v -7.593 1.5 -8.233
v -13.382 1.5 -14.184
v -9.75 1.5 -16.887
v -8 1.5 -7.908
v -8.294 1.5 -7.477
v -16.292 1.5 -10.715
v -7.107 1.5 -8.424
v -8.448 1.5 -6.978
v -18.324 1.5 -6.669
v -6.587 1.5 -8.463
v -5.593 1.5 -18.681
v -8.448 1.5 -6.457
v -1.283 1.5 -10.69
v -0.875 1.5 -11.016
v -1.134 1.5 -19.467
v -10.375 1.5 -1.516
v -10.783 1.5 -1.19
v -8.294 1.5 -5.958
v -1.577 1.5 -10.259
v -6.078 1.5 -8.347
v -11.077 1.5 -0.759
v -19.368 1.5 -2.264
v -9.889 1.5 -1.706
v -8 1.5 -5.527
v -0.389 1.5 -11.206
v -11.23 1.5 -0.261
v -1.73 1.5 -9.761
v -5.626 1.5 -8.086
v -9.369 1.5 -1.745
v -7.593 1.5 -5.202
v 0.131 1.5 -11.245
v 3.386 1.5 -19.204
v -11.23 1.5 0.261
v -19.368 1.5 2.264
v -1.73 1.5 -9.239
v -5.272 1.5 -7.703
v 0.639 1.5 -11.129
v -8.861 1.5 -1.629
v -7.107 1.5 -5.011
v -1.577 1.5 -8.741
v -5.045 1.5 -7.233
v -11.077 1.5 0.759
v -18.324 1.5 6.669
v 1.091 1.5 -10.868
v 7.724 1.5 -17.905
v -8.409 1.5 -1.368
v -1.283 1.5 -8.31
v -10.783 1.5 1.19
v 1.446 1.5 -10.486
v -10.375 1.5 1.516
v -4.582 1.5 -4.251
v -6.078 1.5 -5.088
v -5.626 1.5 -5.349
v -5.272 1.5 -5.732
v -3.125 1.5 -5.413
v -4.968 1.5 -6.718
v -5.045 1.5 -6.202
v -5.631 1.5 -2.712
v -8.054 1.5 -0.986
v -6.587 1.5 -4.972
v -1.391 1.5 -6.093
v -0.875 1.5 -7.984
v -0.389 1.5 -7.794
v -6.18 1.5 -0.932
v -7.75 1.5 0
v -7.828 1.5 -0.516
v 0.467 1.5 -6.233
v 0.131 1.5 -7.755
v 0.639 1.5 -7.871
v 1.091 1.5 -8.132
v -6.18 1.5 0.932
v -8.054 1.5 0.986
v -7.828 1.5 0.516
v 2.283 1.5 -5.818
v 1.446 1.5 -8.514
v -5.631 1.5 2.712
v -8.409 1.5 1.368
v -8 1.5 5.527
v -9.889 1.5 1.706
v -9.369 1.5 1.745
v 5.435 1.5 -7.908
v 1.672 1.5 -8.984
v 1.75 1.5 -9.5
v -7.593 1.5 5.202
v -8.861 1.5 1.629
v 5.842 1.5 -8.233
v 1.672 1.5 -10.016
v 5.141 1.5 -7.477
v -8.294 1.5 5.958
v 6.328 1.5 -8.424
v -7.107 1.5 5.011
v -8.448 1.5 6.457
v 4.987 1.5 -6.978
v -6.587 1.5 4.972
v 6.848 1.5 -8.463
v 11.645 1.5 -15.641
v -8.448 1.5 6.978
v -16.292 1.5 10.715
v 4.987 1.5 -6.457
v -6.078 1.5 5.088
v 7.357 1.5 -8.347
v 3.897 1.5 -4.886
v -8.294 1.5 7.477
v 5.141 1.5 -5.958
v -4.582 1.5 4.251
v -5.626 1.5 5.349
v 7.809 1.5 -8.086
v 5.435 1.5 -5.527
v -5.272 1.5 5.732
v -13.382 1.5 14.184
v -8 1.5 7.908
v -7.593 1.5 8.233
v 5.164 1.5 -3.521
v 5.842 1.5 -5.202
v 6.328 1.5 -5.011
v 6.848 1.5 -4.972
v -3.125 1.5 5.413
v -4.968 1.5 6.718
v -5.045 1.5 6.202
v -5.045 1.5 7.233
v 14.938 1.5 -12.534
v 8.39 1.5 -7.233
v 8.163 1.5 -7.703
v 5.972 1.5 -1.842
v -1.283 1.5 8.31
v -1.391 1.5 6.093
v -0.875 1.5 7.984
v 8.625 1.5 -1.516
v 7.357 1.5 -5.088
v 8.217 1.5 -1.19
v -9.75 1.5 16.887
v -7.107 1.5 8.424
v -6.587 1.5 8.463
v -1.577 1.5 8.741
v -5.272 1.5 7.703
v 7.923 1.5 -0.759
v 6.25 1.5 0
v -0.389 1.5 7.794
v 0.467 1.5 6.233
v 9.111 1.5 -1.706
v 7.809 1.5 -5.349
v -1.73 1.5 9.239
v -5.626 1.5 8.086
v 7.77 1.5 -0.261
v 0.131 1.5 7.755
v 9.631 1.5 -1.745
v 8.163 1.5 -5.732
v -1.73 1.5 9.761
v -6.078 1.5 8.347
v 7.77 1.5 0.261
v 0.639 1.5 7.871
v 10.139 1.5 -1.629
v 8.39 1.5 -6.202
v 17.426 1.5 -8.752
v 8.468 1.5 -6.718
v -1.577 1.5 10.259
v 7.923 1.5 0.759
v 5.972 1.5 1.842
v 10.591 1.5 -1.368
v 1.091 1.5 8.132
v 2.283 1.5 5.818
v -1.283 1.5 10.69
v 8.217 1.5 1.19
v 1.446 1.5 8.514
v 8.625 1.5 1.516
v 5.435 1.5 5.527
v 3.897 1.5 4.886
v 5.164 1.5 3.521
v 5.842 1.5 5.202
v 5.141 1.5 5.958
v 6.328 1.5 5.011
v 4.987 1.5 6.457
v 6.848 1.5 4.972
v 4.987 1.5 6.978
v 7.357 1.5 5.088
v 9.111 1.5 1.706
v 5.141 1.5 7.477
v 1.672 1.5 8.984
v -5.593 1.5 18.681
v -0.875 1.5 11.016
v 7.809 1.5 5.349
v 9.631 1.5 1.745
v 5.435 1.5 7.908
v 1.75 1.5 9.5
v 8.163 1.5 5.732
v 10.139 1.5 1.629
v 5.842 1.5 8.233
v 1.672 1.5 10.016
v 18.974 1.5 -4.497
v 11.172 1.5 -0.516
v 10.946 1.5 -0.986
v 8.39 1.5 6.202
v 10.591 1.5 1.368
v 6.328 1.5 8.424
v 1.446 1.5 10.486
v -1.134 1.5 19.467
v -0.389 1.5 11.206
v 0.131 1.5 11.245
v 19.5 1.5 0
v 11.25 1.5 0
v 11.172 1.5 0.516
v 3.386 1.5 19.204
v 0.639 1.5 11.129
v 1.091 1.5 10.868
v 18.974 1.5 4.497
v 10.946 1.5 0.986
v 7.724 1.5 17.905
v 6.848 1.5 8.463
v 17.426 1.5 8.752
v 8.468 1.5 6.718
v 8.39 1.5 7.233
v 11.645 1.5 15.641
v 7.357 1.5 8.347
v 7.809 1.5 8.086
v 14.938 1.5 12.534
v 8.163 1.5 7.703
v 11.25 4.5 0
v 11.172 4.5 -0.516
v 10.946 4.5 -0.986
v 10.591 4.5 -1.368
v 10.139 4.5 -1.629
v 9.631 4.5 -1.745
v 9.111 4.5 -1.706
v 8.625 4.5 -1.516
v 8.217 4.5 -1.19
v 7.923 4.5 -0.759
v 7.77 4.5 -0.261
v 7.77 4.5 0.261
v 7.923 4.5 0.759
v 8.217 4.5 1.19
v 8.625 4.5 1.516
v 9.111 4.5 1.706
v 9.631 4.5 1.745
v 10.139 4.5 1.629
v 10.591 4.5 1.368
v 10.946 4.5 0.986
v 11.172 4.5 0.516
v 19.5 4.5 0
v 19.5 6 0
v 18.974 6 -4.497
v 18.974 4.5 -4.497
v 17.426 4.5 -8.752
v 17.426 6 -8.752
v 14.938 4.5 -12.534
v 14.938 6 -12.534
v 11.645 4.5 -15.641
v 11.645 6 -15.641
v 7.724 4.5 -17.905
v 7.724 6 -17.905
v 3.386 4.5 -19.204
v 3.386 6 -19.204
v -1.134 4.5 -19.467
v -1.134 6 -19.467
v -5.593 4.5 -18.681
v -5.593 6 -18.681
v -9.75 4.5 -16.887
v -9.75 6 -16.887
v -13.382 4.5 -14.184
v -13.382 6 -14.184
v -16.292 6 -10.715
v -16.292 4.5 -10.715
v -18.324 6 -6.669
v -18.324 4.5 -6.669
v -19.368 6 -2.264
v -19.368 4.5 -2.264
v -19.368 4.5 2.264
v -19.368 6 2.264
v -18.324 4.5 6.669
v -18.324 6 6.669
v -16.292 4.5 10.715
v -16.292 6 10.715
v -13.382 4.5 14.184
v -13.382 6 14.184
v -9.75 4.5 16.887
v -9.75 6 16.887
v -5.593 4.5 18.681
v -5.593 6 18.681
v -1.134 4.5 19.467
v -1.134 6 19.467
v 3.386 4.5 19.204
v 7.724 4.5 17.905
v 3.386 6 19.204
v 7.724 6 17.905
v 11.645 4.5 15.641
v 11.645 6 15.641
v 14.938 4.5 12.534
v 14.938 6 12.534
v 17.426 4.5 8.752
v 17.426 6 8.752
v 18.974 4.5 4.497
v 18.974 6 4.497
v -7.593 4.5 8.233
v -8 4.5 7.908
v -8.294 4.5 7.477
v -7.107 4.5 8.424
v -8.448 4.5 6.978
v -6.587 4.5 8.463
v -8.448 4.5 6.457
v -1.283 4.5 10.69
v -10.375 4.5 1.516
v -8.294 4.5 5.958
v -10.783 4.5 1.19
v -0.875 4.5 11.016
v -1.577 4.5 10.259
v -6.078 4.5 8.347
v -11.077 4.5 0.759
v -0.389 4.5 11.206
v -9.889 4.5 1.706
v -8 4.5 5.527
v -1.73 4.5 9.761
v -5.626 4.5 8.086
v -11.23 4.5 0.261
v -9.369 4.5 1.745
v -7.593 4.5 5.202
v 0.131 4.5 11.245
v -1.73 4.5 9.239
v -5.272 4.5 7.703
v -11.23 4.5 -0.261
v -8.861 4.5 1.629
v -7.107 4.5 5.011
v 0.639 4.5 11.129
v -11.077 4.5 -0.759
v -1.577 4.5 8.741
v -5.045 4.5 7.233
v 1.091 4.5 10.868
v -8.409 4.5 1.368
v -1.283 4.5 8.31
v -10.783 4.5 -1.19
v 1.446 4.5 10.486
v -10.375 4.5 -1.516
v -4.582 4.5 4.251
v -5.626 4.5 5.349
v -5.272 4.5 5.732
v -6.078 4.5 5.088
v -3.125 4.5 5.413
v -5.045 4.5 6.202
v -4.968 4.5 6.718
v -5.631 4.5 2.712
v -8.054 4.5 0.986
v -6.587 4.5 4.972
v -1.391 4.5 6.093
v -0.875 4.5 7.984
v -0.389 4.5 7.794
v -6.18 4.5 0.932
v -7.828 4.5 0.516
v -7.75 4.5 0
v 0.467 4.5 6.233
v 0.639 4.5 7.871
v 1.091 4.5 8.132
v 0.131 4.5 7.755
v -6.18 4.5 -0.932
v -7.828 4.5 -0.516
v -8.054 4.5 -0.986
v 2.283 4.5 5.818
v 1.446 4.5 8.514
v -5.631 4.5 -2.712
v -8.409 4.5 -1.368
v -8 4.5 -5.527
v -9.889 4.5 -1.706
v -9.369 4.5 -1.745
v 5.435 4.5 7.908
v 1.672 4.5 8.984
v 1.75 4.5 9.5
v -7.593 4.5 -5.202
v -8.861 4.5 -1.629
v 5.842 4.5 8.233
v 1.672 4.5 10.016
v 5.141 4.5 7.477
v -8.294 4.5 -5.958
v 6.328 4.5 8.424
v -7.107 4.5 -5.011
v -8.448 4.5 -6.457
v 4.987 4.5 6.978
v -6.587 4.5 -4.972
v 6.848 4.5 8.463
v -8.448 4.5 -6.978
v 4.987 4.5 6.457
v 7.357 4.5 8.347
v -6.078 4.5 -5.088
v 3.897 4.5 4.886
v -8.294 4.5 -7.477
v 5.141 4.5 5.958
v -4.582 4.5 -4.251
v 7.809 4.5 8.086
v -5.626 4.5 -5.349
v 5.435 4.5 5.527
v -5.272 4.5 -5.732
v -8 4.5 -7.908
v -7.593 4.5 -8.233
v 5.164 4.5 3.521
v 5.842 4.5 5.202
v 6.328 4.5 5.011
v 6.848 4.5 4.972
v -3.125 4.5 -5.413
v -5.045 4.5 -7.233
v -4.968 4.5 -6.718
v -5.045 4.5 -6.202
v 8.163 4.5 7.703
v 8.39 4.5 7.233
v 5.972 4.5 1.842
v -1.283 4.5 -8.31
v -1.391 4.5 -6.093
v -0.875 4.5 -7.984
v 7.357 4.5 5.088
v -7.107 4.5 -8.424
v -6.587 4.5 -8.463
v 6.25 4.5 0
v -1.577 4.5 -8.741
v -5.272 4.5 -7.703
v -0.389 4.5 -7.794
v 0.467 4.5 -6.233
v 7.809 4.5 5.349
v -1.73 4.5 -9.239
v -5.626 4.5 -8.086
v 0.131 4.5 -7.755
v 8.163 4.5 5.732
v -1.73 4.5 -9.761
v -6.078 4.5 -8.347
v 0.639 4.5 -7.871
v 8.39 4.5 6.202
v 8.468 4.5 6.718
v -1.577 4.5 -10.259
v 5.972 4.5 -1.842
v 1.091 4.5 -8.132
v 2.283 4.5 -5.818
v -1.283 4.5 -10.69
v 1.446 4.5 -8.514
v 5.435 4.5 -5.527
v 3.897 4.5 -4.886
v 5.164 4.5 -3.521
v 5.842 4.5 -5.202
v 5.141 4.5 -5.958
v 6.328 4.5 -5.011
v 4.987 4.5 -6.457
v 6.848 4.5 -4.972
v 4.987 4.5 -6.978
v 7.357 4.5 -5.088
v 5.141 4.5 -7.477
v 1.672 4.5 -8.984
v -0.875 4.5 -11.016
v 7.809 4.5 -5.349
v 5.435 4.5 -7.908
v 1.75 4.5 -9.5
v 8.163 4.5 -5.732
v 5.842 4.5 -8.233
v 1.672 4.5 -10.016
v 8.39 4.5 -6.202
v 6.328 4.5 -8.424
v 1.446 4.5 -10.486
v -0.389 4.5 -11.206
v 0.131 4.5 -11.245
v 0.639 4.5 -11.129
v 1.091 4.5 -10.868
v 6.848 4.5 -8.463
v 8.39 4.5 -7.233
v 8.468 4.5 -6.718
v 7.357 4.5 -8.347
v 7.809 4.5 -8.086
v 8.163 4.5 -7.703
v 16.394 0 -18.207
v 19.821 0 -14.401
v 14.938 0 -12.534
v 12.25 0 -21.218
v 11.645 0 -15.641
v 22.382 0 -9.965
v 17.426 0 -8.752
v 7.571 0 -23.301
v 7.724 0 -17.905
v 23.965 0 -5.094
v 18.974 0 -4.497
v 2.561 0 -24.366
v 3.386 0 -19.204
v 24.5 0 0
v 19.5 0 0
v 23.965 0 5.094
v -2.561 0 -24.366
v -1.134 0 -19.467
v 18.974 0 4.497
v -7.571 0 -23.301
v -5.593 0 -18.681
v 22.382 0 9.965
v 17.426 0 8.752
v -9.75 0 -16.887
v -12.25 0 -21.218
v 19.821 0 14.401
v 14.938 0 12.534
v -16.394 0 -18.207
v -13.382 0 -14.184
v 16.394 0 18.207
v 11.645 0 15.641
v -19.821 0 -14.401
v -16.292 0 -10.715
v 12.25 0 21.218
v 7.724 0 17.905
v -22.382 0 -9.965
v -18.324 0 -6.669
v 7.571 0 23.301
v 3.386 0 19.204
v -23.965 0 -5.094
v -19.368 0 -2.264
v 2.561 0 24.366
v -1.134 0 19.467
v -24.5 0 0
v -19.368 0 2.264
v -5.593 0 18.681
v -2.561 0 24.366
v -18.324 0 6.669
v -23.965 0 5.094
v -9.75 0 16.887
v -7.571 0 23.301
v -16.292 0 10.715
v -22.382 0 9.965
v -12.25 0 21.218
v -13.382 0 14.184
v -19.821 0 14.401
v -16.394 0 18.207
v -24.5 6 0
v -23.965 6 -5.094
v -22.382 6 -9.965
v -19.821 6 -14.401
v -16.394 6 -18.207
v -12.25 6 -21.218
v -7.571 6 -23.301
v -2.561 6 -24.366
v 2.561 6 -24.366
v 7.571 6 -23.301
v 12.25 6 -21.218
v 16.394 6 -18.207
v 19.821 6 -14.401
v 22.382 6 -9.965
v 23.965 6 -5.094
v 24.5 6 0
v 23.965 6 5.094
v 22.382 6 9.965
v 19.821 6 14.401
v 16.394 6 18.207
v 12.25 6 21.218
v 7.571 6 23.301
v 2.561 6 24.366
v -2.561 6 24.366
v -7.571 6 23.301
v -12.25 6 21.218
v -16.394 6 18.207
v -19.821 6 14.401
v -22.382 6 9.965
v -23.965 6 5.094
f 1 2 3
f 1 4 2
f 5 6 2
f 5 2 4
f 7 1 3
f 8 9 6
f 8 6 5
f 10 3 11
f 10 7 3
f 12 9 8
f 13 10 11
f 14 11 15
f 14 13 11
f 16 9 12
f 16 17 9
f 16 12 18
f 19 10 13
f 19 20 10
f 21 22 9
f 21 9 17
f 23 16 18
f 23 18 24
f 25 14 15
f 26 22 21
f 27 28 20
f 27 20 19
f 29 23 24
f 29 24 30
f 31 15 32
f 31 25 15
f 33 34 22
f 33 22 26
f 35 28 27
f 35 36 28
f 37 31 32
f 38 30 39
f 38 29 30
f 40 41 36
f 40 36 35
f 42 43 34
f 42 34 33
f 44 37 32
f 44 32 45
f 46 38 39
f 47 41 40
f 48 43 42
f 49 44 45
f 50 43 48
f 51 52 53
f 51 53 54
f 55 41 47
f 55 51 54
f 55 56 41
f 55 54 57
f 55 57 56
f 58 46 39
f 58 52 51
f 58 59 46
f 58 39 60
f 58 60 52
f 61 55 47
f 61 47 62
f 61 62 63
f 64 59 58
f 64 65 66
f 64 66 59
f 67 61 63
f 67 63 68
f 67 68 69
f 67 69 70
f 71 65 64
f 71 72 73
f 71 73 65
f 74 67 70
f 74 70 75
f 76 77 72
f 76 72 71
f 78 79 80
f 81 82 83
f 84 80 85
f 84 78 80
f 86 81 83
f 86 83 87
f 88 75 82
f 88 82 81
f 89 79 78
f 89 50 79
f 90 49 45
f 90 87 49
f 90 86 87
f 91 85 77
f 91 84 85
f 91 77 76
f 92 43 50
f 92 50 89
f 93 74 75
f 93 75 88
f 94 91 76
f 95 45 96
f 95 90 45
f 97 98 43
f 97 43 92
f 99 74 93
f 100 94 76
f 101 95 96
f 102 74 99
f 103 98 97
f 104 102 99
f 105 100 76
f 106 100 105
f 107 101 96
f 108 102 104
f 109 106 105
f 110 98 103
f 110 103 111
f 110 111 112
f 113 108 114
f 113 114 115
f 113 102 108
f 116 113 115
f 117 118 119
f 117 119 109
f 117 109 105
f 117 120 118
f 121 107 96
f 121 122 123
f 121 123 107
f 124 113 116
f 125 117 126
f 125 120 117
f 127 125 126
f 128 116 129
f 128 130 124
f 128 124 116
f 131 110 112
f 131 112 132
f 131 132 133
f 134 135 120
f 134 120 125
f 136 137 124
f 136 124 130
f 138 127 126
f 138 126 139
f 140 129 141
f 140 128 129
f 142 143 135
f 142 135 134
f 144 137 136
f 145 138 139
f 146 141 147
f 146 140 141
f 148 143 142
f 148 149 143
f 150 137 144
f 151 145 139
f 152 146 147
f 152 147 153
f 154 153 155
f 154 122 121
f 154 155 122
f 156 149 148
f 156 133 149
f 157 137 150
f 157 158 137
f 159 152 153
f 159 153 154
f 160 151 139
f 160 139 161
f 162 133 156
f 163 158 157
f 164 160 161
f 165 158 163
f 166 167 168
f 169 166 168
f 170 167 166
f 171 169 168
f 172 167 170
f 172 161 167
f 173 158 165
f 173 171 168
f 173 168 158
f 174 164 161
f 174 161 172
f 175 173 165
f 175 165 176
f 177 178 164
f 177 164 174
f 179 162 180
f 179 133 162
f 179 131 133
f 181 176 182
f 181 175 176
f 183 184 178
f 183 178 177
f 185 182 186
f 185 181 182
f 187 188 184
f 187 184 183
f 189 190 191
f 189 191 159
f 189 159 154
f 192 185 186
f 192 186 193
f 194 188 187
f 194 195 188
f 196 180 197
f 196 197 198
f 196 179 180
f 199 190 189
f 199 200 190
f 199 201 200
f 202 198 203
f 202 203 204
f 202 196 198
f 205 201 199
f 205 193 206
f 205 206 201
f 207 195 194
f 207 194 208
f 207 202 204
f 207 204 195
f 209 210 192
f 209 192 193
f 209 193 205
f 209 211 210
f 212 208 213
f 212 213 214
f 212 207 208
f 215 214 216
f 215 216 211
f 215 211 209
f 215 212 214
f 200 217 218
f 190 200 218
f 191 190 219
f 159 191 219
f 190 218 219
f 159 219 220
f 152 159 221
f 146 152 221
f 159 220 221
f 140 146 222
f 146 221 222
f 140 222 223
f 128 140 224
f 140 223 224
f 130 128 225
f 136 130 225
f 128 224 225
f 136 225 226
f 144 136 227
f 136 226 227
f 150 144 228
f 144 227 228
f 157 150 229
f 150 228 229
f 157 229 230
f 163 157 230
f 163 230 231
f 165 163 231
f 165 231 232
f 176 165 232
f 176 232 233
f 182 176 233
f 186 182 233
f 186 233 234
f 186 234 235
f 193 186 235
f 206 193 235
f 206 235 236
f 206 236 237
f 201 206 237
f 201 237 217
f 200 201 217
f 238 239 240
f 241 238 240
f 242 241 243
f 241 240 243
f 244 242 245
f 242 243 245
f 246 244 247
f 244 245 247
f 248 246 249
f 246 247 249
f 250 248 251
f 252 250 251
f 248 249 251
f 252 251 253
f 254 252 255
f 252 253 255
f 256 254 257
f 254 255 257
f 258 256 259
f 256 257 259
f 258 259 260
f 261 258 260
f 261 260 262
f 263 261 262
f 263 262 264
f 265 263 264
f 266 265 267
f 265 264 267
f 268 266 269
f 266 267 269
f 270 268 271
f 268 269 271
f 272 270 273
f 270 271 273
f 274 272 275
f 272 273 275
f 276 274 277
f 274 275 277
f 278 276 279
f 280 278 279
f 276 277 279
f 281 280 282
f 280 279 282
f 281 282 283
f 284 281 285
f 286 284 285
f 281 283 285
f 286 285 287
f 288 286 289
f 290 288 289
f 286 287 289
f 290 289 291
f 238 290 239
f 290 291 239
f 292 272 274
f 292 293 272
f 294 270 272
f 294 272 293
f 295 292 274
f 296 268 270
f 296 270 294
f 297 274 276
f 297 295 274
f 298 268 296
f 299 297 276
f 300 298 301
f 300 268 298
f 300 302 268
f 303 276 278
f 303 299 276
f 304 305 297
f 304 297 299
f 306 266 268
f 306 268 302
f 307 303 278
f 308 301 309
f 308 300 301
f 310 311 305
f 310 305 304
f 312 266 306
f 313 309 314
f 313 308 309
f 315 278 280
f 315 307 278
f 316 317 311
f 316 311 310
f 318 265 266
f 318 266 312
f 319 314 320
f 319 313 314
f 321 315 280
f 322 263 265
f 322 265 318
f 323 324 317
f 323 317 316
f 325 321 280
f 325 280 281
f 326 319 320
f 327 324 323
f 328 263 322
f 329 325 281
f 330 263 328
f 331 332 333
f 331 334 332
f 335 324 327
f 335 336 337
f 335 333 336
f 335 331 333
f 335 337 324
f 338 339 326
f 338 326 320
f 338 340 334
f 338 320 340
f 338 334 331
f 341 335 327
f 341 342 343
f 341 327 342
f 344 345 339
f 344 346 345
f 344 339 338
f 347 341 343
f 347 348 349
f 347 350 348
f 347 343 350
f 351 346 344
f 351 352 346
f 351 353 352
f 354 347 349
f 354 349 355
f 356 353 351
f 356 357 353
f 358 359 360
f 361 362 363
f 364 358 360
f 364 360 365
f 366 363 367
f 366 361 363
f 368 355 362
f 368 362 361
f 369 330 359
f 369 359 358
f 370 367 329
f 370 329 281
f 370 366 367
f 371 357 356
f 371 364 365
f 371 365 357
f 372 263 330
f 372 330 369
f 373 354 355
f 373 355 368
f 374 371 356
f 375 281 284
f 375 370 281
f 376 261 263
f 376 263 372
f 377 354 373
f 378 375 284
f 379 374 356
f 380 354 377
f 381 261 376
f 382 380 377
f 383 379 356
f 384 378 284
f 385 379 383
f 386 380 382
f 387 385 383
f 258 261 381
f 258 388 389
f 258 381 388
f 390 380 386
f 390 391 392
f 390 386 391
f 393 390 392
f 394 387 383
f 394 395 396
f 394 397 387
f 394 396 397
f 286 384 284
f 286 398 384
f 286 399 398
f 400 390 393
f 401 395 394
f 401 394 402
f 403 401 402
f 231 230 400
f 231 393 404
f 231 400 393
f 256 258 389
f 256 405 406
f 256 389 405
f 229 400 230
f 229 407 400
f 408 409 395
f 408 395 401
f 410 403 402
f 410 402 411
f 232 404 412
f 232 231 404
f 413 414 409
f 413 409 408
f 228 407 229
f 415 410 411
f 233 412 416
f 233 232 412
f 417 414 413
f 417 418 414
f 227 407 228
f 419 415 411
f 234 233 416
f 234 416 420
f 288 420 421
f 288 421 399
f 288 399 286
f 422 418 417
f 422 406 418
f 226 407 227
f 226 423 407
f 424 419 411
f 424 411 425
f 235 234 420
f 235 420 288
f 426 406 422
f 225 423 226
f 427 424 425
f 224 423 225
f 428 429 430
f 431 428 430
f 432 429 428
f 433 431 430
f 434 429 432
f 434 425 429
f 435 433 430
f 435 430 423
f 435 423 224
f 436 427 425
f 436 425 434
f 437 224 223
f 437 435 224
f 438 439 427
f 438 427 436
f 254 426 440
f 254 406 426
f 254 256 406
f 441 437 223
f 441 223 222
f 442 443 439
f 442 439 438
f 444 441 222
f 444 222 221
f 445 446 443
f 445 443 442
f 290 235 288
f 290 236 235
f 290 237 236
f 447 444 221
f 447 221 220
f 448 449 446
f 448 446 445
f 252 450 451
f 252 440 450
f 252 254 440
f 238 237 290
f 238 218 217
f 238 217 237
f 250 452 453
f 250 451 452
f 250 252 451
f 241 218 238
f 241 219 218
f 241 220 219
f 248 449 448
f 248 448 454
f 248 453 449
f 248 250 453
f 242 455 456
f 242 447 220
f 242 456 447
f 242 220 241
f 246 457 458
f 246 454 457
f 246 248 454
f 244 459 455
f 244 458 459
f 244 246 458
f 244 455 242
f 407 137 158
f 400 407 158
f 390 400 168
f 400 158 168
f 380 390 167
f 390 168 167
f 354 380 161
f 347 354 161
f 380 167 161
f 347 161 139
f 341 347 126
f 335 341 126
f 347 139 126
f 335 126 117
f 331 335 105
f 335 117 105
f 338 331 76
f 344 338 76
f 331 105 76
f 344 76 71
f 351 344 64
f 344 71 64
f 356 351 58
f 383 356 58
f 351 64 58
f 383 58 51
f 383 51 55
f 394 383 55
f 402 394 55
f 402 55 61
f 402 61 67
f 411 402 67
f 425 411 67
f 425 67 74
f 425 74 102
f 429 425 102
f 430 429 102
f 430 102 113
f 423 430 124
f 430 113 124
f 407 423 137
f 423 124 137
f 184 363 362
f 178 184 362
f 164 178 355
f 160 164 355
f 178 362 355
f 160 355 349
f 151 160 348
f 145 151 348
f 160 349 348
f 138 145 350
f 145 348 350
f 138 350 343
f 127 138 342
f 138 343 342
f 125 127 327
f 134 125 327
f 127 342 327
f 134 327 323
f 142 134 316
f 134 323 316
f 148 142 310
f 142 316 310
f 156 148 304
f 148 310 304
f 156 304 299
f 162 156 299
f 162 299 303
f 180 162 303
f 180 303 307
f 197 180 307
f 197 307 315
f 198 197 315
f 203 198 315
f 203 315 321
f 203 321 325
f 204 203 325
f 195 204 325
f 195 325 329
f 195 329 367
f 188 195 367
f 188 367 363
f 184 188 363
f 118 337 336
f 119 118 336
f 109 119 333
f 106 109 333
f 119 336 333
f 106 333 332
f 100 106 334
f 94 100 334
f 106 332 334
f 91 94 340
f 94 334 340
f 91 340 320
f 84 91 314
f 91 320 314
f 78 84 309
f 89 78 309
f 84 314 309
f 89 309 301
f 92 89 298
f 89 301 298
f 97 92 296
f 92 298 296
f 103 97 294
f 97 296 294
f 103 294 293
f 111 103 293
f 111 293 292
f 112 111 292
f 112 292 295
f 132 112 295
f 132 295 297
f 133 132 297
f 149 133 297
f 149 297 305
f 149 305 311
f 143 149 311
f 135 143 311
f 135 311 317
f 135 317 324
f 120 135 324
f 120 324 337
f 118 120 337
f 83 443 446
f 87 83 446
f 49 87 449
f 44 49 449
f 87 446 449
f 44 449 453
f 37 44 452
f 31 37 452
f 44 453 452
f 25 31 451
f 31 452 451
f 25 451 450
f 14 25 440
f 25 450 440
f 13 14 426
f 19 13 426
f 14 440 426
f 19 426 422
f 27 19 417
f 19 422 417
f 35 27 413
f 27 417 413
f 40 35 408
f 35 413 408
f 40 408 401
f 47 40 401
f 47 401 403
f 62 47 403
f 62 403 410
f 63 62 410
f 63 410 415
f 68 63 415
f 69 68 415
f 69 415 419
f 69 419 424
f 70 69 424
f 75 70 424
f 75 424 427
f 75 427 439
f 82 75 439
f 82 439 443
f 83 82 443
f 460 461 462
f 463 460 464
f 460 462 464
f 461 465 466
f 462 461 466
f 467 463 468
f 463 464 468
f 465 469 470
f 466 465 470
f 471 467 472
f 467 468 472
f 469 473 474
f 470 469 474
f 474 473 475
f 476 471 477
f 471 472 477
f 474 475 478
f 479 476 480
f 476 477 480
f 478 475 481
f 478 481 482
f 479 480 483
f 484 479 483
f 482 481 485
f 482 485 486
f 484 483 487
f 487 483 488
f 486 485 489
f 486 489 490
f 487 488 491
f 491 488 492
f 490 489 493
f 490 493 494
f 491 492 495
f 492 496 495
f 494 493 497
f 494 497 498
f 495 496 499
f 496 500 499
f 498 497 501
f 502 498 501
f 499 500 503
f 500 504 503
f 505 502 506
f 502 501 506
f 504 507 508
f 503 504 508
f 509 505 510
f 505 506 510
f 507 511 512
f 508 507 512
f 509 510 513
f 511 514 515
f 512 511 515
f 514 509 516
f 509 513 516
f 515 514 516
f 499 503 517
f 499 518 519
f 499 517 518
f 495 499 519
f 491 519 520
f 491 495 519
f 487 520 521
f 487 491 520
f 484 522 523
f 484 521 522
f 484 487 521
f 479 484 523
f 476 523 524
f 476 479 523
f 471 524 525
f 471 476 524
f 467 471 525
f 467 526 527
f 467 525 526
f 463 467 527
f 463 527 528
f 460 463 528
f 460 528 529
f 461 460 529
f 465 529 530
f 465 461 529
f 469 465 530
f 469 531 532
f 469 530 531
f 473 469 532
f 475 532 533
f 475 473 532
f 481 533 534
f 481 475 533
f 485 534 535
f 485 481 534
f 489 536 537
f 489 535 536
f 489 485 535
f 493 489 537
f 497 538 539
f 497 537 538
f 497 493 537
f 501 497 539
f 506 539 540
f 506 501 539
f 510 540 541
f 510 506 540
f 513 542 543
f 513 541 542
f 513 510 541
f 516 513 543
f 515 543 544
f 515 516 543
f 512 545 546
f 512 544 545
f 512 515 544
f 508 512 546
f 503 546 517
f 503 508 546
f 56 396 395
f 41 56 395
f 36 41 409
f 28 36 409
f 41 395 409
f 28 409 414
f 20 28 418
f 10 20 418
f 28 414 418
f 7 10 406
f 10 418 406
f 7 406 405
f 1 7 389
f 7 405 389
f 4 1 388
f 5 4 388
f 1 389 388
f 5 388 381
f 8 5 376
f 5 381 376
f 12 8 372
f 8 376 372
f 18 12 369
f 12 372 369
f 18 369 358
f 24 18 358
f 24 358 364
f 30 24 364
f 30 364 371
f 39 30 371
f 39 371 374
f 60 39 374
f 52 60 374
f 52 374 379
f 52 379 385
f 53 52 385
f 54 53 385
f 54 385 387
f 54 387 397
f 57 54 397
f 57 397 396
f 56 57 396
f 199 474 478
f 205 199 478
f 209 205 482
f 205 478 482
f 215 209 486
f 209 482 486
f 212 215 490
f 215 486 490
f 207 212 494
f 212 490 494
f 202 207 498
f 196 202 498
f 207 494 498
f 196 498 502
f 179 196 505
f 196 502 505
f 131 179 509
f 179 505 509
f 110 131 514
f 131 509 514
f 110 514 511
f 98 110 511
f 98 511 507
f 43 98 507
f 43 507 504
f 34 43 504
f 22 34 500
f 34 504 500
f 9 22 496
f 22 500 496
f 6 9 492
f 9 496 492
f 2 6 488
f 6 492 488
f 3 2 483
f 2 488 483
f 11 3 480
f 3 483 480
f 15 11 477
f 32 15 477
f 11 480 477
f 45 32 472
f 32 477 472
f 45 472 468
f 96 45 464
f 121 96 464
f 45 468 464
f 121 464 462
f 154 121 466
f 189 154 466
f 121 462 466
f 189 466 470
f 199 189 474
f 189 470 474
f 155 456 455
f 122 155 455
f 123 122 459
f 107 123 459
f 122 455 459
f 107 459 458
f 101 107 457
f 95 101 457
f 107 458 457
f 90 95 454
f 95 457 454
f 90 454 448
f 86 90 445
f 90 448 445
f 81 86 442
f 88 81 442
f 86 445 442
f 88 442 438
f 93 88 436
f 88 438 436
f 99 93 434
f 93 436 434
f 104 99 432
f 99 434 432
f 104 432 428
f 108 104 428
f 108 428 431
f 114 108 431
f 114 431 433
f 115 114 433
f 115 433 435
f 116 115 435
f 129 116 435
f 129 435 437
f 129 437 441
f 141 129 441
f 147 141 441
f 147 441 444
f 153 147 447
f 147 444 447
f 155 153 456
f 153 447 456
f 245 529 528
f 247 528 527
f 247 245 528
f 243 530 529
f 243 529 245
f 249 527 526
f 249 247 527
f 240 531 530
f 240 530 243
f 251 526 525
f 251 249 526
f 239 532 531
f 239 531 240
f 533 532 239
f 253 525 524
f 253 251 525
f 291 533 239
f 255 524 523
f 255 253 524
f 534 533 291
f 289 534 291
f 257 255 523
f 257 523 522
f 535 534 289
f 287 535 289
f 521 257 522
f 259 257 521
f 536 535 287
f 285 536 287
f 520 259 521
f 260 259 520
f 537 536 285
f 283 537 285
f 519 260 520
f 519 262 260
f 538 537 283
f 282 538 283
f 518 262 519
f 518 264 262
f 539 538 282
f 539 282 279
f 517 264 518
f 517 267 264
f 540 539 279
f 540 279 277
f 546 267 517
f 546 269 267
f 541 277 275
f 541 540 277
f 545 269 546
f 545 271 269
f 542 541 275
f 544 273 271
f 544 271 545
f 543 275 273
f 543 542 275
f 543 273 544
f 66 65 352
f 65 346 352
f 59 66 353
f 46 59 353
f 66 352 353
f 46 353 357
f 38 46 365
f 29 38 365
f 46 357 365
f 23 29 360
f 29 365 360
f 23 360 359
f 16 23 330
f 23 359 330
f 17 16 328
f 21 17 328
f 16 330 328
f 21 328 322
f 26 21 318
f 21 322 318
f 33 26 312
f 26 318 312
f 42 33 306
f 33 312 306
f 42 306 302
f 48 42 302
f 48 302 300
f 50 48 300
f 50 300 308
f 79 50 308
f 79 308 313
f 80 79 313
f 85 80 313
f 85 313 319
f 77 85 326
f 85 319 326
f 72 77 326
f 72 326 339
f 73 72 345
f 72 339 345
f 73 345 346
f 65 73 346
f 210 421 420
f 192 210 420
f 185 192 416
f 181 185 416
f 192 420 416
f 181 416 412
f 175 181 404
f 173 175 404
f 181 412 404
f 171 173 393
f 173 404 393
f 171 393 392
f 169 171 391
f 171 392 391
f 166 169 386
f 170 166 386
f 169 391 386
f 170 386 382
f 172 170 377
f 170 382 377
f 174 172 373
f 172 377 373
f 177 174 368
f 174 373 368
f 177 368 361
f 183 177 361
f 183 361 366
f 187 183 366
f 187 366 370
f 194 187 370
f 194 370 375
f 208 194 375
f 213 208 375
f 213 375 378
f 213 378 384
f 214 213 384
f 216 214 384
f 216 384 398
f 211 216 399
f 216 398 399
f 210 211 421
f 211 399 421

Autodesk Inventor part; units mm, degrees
ref_plane "YZ Plane" through (0, 0, 0) normal (1, 0, 0) x (0, 1, 0)
ref_plane "XZ Plane" through (0, 0, 0) normal (0, 1, 0) x (-1, 0, 0)
ref_plane "XY Plane" through (0, 0, 0) normal (0, 0, 1) x (1, 0, 0)
sketch "WheelSketch" plane through (0, 0, 0) normal (0, 1, 0) x (-1, 0, 0)
  circle A0 centre (0, 0) radius 24.5
  dimension "EncoderWheel_Tyre_Diameter" = 49
extrude "Wheel" add sketch "WheelSketch" along normal blind 6
sketch "Sketch2" plane through (0, 6, 0) normal (0, 1, 0) x (1, 0, 0)
  circle A0 centre (0, 0) radius 24.5 projected
  circle A1 centre (0, 0) radius 19.5
  dimension "EncoderWheel_Tyre_Thickness" = 5
extrude "Extrusion2" cut sketch "Sketch2" against normal blind 1.5 contours A1
sketch "Sketch3" plane through (0, 0, 0) normal (0, -1, 0) x (1, 0, 0)
  circle A0 centre (0, 0) radius 24.5 projected
  circle A1 centre (0, 0) radius 19.5
  dimension "d7" = 5
extrude "Extrusion3" cut sketch "Sketch3" against normal blind 1.5 contours A1
sketch "InnerHoleSketch" plane through (0, 1.5, 0) normal (0, -1, 0) x (1, 0, 0)
  circle A0 centre (0, 0) radius 19.5 projected
  circle A1 centre (0, 0) radius 6.25
  dimension "EncoderWheel_InnerHole_Diameter" = 12.5
extrude "InnerHole" cut sketch "InnerHoleSketch" against normal up to next contours A1
sketch "FasteningHoleSketch" plane through (0, 4.5, 0) normal (0, 1, 0) x (1, 0, 0)
  circle A0 centre (0, 0) radius 6.25 projected
  circle A1 centre (0, 0) radius 19.5 projected
  circle A2 centre (0, 9.5) radius 1.75
  line L0 (0, 0) -> (0, 29.2255) construction
  circle A3 centre (-6.7175, 6.7175) radius 1.75
  circle A4 centre (-9.5, 0) radius 1.75
  circle A5 centre (-6.7175, -6.7175) radius 1.75
  circle A6 centre (0, -9.5) radius 1.75
  circle A7 centre (6.7175, -6.7175) radius 1.75
  circle A8 centre (9.5, 0) radius 1.75
  circle A9 centre (6.7175, 6.7175) radius 1.75
  dimension "EncoderWheel_FasteningHole_Diameter" = 3.5
  dimension "EncoderWheel_FasteningHole_DistanceToCenter" = 9.5
  dimension "d17" = 360
extrude "FasteningHole" cut sketch "FasteningHoleSketch" against normal up to next contours A2 | A3 | A4 | A5 | A6 | A7 | A8 | A9
equation "\"d7\" = EncoderWheel_Tyre_Thickness"
equation "\"EncoderWheel_InnerDiameter\" = EncoderWheel_Tyre_Diameter - 2 * EncoderWheel_Tyre_Thickness"
properties part number "EncoderWheel" material "Rubber, Silicone"
